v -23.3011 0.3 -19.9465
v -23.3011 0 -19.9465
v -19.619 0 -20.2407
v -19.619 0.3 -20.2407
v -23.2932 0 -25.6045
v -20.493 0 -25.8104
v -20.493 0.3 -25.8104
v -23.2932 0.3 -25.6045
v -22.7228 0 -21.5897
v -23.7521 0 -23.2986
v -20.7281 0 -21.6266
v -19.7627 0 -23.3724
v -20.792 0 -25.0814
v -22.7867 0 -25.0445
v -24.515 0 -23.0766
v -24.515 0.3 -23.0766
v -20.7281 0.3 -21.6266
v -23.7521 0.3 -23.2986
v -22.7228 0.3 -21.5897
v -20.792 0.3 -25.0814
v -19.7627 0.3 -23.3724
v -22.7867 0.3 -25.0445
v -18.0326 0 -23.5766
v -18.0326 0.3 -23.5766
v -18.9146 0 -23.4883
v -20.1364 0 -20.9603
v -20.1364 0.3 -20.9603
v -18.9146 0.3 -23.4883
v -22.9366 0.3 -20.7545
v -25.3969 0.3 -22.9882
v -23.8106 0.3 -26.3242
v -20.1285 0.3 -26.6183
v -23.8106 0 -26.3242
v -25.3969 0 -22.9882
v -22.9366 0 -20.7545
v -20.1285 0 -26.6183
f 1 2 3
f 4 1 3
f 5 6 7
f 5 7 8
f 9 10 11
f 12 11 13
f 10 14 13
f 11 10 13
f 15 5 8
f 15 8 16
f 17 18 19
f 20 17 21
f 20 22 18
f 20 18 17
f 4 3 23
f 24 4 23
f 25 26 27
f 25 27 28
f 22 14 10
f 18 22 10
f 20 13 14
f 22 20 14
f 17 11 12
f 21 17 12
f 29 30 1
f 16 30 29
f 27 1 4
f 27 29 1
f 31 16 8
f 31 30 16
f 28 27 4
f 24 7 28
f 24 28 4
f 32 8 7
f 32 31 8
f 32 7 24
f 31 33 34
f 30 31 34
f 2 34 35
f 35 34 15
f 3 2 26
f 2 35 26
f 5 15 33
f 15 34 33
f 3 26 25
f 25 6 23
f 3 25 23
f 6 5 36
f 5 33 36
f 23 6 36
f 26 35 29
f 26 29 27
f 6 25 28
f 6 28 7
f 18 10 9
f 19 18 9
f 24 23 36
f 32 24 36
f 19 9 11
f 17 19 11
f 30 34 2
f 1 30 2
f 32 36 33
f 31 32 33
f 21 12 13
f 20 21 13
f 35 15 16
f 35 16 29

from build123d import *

# Parameters (mm, degrees)
BOSS_EXTRUDE1_DEPTH = 0.3
BOSS_EXTRUDE2_DEPTH = 0.3


with BuildPart() as part:
    # Sketch1 → Boss-Extrude1 (new body)
    with BuildSketch(Plane(origin=(0, 0, 0), x_dir=(1, 0, 0), z_dir=(0, 1, 0))):
        Polygon((-19.618957041, 20.240683804), (-18.032649715, 23.576605395), (-20.128488895, 26.618348634), (-23.810635401, 26.324170281), (-25.396942728, 22.98824869), (-23.301103548, 19.946505451), align=None)
        Polygon((-20.136429104, 20.960344021), (-18.914629777, 23.488291552), (-20.492996894, 25.810374573), (-23.293163338, 25.604510064), (-24.514962666, 23.076562533), (-22.936595549, 20.754479512), align=None, mode=Mode.SUBTRACT)
    extrude(amount=BOSS_EXTRUDE1_DEPTH)


with BuildPart() as body_2:
    # Sketch3 → Boss-Extrude2 (new body)
    with BuildSketch(Plane(origin=(0, 0, 0), x_dir=(1, 0, 0), z_dir=(0, 1, 0))):
        Polygon((-20.72810566, 21.626559942), (-19.762728669, 23.372443274), (-20.792019491, 25.081425938), (-22.786687304, 25.044525271), (-23.752064295, 23.298641939), (-22.722773473, 21.589659274), align=None)
    extrude(amount=BOSS_EXTRUDE2_DEPTH)


solid = Compound([part.part, body_2.part])
